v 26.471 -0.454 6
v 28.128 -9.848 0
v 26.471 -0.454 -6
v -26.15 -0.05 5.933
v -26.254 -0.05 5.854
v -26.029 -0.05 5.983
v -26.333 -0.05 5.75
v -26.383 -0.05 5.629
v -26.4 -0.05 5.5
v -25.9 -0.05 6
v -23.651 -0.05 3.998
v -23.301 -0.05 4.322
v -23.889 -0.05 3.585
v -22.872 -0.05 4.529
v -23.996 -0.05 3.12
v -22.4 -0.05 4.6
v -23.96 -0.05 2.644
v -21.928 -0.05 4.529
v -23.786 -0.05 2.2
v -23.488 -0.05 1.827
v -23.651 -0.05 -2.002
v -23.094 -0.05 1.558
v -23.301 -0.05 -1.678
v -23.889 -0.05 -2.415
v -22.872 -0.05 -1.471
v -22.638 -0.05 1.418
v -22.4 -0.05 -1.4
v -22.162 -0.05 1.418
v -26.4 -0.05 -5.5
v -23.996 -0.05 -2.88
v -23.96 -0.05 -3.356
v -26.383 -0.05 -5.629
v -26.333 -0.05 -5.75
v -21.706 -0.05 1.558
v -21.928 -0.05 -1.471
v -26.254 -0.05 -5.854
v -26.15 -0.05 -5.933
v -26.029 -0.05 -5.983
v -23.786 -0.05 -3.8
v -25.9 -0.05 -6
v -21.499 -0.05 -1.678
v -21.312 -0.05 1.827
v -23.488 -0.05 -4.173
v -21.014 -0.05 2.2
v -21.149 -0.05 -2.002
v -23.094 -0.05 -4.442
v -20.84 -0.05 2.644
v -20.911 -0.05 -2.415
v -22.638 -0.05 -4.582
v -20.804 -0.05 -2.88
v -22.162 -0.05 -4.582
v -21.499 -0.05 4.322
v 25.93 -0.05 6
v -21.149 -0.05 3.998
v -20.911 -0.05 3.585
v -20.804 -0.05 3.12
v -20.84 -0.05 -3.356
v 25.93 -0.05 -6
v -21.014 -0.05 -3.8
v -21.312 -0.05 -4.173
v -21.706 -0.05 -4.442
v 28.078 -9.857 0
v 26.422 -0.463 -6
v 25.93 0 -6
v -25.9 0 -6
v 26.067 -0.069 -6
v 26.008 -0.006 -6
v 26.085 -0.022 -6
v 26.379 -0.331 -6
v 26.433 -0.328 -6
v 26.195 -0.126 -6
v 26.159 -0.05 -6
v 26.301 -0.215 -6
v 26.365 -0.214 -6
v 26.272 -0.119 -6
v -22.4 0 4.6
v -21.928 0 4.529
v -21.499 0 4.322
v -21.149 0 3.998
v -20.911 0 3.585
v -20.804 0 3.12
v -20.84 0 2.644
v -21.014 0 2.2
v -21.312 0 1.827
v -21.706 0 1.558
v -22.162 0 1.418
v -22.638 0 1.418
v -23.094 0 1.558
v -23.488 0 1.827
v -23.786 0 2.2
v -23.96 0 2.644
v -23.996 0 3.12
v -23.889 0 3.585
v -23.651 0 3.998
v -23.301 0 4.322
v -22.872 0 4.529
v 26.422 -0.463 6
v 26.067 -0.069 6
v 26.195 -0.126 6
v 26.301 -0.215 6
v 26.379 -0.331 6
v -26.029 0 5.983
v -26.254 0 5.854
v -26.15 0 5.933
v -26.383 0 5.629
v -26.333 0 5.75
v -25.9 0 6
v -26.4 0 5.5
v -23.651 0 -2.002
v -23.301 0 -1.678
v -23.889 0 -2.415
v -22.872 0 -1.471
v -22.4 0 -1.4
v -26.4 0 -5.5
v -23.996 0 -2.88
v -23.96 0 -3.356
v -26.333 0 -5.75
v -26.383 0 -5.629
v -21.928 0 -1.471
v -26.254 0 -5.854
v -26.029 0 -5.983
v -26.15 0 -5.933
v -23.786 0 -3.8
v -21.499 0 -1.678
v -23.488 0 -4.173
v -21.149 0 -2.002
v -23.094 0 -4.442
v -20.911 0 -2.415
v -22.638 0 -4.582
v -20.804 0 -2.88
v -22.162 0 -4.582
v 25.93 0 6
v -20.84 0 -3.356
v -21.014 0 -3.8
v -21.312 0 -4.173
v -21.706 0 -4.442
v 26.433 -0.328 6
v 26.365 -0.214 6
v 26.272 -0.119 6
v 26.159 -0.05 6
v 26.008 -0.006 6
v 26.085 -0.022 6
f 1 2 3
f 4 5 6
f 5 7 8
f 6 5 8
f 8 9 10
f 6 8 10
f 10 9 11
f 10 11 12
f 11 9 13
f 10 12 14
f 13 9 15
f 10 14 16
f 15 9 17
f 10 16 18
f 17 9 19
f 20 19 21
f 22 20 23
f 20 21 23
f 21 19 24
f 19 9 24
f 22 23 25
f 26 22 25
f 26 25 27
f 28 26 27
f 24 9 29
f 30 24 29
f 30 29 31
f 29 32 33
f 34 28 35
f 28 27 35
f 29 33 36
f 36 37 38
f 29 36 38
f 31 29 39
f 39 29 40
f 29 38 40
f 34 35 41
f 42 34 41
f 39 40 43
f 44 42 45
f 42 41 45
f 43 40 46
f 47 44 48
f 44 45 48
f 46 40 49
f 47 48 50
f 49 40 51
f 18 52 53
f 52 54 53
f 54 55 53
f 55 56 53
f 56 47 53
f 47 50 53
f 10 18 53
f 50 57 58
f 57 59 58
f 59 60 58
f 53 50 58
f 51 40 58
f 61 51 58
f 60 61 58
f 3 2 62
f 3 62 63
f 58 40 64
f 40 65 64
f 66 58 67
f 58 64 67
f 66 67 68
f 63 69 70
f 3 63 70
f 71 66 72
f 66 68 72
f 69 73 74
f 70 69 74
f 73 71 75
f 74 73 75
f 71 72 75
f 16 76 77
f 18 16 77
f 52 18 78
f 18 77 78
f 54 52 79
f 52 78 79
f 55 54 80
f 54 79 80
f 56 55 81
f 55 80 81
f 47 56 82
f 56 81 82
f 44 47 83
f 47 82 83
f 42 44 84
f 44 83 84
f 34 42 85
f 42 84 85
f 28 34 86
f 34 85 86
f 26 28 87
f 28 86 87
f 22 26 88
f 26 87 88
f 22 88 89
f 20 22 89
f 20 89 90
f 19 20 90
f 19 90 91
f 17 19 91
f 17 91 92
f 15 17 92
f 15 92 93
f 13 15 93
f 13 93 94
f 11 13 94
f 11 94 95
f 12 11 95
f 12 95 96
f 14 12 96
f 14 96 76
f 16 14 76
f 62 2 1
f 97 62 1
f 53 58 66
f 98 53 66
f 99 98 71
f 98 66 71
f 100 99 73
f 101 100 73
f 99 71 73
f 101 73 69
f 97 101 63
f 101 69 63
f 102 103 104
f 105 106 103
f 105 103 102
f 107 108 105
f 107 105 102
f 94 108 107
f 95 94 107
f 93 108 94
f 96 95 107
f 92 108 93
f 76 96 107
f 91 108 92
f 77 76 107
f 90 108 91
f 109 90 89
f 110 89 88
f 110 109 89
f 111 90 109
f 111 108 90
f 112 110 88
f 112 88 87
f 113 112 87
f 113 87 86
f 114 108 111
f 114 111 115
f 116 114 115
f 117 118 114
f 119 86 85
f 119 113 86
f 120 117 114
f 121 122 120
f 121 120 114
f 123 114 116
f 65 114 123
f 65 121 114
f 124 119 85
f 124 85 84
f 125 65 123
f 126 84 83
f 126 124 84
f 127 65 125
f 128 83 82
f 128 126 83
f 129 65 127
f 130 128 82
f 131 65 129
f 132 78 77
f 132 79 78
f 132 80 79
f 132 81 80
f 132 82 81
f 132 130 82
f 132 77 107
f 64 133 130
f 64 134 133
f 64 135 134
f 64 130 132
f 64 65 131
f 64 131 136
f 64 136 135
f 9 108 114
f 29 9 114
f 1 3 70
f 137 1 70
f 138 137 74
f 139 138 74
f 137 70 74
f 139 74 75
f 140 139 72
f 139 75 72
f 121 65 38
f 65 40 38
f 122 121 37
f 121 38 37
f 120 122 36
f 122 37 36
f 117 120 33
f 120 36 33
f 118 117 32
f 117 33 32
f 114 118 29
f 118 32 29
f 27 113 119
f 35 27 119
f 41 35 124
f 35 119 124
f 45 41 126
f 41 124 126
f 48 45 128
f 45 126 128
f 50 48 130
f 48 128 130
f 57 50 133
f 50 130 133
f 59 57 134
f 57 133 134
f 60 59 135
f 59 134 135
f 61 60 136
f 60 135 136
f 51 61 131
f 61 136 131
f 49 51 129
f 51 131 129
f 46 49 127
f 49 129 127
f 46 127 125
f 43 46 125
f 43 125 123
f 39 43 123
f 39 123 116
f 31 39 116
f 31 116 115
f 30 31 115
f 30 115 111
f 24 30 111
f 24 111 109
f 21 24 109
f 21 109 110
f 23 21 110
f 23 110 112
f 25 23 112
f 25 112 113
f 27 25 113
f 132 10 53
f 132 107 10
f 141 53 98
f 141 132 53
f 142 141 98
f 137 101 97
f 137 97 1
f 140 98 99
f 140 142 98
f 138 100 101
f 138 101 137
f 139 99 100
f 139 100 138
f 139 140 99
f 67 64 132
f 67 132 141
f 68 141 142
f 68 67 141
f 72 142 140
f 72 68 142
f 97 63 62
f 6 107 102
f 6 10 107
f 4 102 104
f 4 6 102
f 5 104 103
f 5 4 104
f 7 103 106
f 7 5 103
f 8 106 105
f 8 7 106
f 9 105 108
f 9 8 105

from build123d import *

# Parameters (mm, degrees)
SKETCH2_W            = 52.8
SKETCH2_H            = 12
BASE_FLANGE1_DEPTH   = 0.05
EDGE_FLANGE1_START   = -6
EDGE_FLANGE1_DEPTH   = 12
EDGE_FLANGE1_2_DEPTH = 12
CUT_EXTRUDE2_DEPTH   = 0.05
SKETCH10_R           = 1.6
CUT_EXTRUDE1_DEPTH   = 31.402652498
FILLET1_R            = 0.5


# Read off the part's stored shape, not the designer's step: Edge-Flange1
# Sheet-metal steps are written as plain solids
with BuildPart() as part:
    # Sketch2 → Base-Flange1 (new body)
    with BuildSketch(Plane(origin=(0, 0, 0), x_dir=(1, 0, 0), z_dir=(0, 1, 0))):
        Rectangle(SKETCH2_W, SKETCH2_H)
    extrude(amount=-BASE_FLANGE1_DEPTH)

    # Edge-Flange1 outline → Edge-Flange1 (cut)
    with BuildSketch(Plane.XY.offset(EDGE_FLANGE1_START)):
        with BuildLine():
            ThreePointArc((25.929678854, 0), (26.046939248, -0.012645368), (26.158807639, -0.05))
            Line((26.158807639, -0.05), (26.4, -0.05))
            Line((26.4, -0.05), (26.4, 0))
            Line((26.4, 0), (25.929678854, 0))
        make_face()
    extrude(amount=EDGE_FLANGE1_DEPTH, mode=Mode.SUBTRACT)

    # Edge-Flange1 2 outline → Edge-Flange1 2 (add)
    with BuildSketch(Plane.XY.offset(EDGE_FLANGE1_START)):
        with BuildLine():
            Line((28.127665428, -9.84807753), (26.471323118, -0.454493502))
            ThreePointArc((26.471323118, -0.454493502), (26.364910426, -0.213735999), (26.158807639, -0.05))
            Line((26.158807639, -0.05), (25.929678854, -0.05))
            ThreePointArc((25.929678854, -0.05), (26.251072659, -0.166977778), (26.42208273, -0.463175911))
            Line((26.42208273, -0.463175911), (28.07842504, -9.856759939))
            Line((28.07842504, -9.856759939), (28.127665428, -9.84807753))
        make_face()
    extrude(amount=EDGE_FLANGE1_2_DEPTH)

    # Sketch11 → Cut-Extrude2 (cut)
    with BuildSketch(Plane(origin=(25.595392091, 4.513158207, 0), x_dir=(0, 0, -1), z_dir=(0.9848077530122074, 0.17364817766693416, 0))):
        Polygon((29.405769939, -61.330580197), (0, -14.582780947), (-6, -5.044285745), (-6, -14.582780947), (-6, -69.810093397), (19.725851686, -177.227060012), (55.131621625, -168.747546812), align=None)
    cut_extrude2 = extrude(amount=-CUT_EXTRUDE2_DEPTH, mode=Mode.SUBTRACT)

    # Mirror1: Cut-Extrude2 across plane
    add(cut_extrude2.mirror(Plane.XY), mode=Mode.SUBTRACT)

    # Sketch10 → Cut-Extrude1 (cut, through all)
    with BuildSketch(Plane(origin=(0, 0, 0), x_dir=(1, 0, 0), z_dir=(0, 1, 0))):
        with Locations(Location((-22.4, 3, 0), (0, 0, 270))):
            Circle(SKETCH10_R)
        with Locations(Location((-22.4, -3, 0), (0, 0, 270))):
            Circle(SKETCH10_R)
    extrude(amount=-CUT_EXTRUDE1_DEPTH, mode=Mode.SUBTRACT)

    # Fillet1
    fillet1_edges = [part.edges().sort_by_distance(p)[0] for p in [
        (-26.4, -0.025, 6),
        (-26.4, -0.025, -6),
    ]]
    fillet(fillet1_edges, radius=FILLET1_R)


solid = part.part
